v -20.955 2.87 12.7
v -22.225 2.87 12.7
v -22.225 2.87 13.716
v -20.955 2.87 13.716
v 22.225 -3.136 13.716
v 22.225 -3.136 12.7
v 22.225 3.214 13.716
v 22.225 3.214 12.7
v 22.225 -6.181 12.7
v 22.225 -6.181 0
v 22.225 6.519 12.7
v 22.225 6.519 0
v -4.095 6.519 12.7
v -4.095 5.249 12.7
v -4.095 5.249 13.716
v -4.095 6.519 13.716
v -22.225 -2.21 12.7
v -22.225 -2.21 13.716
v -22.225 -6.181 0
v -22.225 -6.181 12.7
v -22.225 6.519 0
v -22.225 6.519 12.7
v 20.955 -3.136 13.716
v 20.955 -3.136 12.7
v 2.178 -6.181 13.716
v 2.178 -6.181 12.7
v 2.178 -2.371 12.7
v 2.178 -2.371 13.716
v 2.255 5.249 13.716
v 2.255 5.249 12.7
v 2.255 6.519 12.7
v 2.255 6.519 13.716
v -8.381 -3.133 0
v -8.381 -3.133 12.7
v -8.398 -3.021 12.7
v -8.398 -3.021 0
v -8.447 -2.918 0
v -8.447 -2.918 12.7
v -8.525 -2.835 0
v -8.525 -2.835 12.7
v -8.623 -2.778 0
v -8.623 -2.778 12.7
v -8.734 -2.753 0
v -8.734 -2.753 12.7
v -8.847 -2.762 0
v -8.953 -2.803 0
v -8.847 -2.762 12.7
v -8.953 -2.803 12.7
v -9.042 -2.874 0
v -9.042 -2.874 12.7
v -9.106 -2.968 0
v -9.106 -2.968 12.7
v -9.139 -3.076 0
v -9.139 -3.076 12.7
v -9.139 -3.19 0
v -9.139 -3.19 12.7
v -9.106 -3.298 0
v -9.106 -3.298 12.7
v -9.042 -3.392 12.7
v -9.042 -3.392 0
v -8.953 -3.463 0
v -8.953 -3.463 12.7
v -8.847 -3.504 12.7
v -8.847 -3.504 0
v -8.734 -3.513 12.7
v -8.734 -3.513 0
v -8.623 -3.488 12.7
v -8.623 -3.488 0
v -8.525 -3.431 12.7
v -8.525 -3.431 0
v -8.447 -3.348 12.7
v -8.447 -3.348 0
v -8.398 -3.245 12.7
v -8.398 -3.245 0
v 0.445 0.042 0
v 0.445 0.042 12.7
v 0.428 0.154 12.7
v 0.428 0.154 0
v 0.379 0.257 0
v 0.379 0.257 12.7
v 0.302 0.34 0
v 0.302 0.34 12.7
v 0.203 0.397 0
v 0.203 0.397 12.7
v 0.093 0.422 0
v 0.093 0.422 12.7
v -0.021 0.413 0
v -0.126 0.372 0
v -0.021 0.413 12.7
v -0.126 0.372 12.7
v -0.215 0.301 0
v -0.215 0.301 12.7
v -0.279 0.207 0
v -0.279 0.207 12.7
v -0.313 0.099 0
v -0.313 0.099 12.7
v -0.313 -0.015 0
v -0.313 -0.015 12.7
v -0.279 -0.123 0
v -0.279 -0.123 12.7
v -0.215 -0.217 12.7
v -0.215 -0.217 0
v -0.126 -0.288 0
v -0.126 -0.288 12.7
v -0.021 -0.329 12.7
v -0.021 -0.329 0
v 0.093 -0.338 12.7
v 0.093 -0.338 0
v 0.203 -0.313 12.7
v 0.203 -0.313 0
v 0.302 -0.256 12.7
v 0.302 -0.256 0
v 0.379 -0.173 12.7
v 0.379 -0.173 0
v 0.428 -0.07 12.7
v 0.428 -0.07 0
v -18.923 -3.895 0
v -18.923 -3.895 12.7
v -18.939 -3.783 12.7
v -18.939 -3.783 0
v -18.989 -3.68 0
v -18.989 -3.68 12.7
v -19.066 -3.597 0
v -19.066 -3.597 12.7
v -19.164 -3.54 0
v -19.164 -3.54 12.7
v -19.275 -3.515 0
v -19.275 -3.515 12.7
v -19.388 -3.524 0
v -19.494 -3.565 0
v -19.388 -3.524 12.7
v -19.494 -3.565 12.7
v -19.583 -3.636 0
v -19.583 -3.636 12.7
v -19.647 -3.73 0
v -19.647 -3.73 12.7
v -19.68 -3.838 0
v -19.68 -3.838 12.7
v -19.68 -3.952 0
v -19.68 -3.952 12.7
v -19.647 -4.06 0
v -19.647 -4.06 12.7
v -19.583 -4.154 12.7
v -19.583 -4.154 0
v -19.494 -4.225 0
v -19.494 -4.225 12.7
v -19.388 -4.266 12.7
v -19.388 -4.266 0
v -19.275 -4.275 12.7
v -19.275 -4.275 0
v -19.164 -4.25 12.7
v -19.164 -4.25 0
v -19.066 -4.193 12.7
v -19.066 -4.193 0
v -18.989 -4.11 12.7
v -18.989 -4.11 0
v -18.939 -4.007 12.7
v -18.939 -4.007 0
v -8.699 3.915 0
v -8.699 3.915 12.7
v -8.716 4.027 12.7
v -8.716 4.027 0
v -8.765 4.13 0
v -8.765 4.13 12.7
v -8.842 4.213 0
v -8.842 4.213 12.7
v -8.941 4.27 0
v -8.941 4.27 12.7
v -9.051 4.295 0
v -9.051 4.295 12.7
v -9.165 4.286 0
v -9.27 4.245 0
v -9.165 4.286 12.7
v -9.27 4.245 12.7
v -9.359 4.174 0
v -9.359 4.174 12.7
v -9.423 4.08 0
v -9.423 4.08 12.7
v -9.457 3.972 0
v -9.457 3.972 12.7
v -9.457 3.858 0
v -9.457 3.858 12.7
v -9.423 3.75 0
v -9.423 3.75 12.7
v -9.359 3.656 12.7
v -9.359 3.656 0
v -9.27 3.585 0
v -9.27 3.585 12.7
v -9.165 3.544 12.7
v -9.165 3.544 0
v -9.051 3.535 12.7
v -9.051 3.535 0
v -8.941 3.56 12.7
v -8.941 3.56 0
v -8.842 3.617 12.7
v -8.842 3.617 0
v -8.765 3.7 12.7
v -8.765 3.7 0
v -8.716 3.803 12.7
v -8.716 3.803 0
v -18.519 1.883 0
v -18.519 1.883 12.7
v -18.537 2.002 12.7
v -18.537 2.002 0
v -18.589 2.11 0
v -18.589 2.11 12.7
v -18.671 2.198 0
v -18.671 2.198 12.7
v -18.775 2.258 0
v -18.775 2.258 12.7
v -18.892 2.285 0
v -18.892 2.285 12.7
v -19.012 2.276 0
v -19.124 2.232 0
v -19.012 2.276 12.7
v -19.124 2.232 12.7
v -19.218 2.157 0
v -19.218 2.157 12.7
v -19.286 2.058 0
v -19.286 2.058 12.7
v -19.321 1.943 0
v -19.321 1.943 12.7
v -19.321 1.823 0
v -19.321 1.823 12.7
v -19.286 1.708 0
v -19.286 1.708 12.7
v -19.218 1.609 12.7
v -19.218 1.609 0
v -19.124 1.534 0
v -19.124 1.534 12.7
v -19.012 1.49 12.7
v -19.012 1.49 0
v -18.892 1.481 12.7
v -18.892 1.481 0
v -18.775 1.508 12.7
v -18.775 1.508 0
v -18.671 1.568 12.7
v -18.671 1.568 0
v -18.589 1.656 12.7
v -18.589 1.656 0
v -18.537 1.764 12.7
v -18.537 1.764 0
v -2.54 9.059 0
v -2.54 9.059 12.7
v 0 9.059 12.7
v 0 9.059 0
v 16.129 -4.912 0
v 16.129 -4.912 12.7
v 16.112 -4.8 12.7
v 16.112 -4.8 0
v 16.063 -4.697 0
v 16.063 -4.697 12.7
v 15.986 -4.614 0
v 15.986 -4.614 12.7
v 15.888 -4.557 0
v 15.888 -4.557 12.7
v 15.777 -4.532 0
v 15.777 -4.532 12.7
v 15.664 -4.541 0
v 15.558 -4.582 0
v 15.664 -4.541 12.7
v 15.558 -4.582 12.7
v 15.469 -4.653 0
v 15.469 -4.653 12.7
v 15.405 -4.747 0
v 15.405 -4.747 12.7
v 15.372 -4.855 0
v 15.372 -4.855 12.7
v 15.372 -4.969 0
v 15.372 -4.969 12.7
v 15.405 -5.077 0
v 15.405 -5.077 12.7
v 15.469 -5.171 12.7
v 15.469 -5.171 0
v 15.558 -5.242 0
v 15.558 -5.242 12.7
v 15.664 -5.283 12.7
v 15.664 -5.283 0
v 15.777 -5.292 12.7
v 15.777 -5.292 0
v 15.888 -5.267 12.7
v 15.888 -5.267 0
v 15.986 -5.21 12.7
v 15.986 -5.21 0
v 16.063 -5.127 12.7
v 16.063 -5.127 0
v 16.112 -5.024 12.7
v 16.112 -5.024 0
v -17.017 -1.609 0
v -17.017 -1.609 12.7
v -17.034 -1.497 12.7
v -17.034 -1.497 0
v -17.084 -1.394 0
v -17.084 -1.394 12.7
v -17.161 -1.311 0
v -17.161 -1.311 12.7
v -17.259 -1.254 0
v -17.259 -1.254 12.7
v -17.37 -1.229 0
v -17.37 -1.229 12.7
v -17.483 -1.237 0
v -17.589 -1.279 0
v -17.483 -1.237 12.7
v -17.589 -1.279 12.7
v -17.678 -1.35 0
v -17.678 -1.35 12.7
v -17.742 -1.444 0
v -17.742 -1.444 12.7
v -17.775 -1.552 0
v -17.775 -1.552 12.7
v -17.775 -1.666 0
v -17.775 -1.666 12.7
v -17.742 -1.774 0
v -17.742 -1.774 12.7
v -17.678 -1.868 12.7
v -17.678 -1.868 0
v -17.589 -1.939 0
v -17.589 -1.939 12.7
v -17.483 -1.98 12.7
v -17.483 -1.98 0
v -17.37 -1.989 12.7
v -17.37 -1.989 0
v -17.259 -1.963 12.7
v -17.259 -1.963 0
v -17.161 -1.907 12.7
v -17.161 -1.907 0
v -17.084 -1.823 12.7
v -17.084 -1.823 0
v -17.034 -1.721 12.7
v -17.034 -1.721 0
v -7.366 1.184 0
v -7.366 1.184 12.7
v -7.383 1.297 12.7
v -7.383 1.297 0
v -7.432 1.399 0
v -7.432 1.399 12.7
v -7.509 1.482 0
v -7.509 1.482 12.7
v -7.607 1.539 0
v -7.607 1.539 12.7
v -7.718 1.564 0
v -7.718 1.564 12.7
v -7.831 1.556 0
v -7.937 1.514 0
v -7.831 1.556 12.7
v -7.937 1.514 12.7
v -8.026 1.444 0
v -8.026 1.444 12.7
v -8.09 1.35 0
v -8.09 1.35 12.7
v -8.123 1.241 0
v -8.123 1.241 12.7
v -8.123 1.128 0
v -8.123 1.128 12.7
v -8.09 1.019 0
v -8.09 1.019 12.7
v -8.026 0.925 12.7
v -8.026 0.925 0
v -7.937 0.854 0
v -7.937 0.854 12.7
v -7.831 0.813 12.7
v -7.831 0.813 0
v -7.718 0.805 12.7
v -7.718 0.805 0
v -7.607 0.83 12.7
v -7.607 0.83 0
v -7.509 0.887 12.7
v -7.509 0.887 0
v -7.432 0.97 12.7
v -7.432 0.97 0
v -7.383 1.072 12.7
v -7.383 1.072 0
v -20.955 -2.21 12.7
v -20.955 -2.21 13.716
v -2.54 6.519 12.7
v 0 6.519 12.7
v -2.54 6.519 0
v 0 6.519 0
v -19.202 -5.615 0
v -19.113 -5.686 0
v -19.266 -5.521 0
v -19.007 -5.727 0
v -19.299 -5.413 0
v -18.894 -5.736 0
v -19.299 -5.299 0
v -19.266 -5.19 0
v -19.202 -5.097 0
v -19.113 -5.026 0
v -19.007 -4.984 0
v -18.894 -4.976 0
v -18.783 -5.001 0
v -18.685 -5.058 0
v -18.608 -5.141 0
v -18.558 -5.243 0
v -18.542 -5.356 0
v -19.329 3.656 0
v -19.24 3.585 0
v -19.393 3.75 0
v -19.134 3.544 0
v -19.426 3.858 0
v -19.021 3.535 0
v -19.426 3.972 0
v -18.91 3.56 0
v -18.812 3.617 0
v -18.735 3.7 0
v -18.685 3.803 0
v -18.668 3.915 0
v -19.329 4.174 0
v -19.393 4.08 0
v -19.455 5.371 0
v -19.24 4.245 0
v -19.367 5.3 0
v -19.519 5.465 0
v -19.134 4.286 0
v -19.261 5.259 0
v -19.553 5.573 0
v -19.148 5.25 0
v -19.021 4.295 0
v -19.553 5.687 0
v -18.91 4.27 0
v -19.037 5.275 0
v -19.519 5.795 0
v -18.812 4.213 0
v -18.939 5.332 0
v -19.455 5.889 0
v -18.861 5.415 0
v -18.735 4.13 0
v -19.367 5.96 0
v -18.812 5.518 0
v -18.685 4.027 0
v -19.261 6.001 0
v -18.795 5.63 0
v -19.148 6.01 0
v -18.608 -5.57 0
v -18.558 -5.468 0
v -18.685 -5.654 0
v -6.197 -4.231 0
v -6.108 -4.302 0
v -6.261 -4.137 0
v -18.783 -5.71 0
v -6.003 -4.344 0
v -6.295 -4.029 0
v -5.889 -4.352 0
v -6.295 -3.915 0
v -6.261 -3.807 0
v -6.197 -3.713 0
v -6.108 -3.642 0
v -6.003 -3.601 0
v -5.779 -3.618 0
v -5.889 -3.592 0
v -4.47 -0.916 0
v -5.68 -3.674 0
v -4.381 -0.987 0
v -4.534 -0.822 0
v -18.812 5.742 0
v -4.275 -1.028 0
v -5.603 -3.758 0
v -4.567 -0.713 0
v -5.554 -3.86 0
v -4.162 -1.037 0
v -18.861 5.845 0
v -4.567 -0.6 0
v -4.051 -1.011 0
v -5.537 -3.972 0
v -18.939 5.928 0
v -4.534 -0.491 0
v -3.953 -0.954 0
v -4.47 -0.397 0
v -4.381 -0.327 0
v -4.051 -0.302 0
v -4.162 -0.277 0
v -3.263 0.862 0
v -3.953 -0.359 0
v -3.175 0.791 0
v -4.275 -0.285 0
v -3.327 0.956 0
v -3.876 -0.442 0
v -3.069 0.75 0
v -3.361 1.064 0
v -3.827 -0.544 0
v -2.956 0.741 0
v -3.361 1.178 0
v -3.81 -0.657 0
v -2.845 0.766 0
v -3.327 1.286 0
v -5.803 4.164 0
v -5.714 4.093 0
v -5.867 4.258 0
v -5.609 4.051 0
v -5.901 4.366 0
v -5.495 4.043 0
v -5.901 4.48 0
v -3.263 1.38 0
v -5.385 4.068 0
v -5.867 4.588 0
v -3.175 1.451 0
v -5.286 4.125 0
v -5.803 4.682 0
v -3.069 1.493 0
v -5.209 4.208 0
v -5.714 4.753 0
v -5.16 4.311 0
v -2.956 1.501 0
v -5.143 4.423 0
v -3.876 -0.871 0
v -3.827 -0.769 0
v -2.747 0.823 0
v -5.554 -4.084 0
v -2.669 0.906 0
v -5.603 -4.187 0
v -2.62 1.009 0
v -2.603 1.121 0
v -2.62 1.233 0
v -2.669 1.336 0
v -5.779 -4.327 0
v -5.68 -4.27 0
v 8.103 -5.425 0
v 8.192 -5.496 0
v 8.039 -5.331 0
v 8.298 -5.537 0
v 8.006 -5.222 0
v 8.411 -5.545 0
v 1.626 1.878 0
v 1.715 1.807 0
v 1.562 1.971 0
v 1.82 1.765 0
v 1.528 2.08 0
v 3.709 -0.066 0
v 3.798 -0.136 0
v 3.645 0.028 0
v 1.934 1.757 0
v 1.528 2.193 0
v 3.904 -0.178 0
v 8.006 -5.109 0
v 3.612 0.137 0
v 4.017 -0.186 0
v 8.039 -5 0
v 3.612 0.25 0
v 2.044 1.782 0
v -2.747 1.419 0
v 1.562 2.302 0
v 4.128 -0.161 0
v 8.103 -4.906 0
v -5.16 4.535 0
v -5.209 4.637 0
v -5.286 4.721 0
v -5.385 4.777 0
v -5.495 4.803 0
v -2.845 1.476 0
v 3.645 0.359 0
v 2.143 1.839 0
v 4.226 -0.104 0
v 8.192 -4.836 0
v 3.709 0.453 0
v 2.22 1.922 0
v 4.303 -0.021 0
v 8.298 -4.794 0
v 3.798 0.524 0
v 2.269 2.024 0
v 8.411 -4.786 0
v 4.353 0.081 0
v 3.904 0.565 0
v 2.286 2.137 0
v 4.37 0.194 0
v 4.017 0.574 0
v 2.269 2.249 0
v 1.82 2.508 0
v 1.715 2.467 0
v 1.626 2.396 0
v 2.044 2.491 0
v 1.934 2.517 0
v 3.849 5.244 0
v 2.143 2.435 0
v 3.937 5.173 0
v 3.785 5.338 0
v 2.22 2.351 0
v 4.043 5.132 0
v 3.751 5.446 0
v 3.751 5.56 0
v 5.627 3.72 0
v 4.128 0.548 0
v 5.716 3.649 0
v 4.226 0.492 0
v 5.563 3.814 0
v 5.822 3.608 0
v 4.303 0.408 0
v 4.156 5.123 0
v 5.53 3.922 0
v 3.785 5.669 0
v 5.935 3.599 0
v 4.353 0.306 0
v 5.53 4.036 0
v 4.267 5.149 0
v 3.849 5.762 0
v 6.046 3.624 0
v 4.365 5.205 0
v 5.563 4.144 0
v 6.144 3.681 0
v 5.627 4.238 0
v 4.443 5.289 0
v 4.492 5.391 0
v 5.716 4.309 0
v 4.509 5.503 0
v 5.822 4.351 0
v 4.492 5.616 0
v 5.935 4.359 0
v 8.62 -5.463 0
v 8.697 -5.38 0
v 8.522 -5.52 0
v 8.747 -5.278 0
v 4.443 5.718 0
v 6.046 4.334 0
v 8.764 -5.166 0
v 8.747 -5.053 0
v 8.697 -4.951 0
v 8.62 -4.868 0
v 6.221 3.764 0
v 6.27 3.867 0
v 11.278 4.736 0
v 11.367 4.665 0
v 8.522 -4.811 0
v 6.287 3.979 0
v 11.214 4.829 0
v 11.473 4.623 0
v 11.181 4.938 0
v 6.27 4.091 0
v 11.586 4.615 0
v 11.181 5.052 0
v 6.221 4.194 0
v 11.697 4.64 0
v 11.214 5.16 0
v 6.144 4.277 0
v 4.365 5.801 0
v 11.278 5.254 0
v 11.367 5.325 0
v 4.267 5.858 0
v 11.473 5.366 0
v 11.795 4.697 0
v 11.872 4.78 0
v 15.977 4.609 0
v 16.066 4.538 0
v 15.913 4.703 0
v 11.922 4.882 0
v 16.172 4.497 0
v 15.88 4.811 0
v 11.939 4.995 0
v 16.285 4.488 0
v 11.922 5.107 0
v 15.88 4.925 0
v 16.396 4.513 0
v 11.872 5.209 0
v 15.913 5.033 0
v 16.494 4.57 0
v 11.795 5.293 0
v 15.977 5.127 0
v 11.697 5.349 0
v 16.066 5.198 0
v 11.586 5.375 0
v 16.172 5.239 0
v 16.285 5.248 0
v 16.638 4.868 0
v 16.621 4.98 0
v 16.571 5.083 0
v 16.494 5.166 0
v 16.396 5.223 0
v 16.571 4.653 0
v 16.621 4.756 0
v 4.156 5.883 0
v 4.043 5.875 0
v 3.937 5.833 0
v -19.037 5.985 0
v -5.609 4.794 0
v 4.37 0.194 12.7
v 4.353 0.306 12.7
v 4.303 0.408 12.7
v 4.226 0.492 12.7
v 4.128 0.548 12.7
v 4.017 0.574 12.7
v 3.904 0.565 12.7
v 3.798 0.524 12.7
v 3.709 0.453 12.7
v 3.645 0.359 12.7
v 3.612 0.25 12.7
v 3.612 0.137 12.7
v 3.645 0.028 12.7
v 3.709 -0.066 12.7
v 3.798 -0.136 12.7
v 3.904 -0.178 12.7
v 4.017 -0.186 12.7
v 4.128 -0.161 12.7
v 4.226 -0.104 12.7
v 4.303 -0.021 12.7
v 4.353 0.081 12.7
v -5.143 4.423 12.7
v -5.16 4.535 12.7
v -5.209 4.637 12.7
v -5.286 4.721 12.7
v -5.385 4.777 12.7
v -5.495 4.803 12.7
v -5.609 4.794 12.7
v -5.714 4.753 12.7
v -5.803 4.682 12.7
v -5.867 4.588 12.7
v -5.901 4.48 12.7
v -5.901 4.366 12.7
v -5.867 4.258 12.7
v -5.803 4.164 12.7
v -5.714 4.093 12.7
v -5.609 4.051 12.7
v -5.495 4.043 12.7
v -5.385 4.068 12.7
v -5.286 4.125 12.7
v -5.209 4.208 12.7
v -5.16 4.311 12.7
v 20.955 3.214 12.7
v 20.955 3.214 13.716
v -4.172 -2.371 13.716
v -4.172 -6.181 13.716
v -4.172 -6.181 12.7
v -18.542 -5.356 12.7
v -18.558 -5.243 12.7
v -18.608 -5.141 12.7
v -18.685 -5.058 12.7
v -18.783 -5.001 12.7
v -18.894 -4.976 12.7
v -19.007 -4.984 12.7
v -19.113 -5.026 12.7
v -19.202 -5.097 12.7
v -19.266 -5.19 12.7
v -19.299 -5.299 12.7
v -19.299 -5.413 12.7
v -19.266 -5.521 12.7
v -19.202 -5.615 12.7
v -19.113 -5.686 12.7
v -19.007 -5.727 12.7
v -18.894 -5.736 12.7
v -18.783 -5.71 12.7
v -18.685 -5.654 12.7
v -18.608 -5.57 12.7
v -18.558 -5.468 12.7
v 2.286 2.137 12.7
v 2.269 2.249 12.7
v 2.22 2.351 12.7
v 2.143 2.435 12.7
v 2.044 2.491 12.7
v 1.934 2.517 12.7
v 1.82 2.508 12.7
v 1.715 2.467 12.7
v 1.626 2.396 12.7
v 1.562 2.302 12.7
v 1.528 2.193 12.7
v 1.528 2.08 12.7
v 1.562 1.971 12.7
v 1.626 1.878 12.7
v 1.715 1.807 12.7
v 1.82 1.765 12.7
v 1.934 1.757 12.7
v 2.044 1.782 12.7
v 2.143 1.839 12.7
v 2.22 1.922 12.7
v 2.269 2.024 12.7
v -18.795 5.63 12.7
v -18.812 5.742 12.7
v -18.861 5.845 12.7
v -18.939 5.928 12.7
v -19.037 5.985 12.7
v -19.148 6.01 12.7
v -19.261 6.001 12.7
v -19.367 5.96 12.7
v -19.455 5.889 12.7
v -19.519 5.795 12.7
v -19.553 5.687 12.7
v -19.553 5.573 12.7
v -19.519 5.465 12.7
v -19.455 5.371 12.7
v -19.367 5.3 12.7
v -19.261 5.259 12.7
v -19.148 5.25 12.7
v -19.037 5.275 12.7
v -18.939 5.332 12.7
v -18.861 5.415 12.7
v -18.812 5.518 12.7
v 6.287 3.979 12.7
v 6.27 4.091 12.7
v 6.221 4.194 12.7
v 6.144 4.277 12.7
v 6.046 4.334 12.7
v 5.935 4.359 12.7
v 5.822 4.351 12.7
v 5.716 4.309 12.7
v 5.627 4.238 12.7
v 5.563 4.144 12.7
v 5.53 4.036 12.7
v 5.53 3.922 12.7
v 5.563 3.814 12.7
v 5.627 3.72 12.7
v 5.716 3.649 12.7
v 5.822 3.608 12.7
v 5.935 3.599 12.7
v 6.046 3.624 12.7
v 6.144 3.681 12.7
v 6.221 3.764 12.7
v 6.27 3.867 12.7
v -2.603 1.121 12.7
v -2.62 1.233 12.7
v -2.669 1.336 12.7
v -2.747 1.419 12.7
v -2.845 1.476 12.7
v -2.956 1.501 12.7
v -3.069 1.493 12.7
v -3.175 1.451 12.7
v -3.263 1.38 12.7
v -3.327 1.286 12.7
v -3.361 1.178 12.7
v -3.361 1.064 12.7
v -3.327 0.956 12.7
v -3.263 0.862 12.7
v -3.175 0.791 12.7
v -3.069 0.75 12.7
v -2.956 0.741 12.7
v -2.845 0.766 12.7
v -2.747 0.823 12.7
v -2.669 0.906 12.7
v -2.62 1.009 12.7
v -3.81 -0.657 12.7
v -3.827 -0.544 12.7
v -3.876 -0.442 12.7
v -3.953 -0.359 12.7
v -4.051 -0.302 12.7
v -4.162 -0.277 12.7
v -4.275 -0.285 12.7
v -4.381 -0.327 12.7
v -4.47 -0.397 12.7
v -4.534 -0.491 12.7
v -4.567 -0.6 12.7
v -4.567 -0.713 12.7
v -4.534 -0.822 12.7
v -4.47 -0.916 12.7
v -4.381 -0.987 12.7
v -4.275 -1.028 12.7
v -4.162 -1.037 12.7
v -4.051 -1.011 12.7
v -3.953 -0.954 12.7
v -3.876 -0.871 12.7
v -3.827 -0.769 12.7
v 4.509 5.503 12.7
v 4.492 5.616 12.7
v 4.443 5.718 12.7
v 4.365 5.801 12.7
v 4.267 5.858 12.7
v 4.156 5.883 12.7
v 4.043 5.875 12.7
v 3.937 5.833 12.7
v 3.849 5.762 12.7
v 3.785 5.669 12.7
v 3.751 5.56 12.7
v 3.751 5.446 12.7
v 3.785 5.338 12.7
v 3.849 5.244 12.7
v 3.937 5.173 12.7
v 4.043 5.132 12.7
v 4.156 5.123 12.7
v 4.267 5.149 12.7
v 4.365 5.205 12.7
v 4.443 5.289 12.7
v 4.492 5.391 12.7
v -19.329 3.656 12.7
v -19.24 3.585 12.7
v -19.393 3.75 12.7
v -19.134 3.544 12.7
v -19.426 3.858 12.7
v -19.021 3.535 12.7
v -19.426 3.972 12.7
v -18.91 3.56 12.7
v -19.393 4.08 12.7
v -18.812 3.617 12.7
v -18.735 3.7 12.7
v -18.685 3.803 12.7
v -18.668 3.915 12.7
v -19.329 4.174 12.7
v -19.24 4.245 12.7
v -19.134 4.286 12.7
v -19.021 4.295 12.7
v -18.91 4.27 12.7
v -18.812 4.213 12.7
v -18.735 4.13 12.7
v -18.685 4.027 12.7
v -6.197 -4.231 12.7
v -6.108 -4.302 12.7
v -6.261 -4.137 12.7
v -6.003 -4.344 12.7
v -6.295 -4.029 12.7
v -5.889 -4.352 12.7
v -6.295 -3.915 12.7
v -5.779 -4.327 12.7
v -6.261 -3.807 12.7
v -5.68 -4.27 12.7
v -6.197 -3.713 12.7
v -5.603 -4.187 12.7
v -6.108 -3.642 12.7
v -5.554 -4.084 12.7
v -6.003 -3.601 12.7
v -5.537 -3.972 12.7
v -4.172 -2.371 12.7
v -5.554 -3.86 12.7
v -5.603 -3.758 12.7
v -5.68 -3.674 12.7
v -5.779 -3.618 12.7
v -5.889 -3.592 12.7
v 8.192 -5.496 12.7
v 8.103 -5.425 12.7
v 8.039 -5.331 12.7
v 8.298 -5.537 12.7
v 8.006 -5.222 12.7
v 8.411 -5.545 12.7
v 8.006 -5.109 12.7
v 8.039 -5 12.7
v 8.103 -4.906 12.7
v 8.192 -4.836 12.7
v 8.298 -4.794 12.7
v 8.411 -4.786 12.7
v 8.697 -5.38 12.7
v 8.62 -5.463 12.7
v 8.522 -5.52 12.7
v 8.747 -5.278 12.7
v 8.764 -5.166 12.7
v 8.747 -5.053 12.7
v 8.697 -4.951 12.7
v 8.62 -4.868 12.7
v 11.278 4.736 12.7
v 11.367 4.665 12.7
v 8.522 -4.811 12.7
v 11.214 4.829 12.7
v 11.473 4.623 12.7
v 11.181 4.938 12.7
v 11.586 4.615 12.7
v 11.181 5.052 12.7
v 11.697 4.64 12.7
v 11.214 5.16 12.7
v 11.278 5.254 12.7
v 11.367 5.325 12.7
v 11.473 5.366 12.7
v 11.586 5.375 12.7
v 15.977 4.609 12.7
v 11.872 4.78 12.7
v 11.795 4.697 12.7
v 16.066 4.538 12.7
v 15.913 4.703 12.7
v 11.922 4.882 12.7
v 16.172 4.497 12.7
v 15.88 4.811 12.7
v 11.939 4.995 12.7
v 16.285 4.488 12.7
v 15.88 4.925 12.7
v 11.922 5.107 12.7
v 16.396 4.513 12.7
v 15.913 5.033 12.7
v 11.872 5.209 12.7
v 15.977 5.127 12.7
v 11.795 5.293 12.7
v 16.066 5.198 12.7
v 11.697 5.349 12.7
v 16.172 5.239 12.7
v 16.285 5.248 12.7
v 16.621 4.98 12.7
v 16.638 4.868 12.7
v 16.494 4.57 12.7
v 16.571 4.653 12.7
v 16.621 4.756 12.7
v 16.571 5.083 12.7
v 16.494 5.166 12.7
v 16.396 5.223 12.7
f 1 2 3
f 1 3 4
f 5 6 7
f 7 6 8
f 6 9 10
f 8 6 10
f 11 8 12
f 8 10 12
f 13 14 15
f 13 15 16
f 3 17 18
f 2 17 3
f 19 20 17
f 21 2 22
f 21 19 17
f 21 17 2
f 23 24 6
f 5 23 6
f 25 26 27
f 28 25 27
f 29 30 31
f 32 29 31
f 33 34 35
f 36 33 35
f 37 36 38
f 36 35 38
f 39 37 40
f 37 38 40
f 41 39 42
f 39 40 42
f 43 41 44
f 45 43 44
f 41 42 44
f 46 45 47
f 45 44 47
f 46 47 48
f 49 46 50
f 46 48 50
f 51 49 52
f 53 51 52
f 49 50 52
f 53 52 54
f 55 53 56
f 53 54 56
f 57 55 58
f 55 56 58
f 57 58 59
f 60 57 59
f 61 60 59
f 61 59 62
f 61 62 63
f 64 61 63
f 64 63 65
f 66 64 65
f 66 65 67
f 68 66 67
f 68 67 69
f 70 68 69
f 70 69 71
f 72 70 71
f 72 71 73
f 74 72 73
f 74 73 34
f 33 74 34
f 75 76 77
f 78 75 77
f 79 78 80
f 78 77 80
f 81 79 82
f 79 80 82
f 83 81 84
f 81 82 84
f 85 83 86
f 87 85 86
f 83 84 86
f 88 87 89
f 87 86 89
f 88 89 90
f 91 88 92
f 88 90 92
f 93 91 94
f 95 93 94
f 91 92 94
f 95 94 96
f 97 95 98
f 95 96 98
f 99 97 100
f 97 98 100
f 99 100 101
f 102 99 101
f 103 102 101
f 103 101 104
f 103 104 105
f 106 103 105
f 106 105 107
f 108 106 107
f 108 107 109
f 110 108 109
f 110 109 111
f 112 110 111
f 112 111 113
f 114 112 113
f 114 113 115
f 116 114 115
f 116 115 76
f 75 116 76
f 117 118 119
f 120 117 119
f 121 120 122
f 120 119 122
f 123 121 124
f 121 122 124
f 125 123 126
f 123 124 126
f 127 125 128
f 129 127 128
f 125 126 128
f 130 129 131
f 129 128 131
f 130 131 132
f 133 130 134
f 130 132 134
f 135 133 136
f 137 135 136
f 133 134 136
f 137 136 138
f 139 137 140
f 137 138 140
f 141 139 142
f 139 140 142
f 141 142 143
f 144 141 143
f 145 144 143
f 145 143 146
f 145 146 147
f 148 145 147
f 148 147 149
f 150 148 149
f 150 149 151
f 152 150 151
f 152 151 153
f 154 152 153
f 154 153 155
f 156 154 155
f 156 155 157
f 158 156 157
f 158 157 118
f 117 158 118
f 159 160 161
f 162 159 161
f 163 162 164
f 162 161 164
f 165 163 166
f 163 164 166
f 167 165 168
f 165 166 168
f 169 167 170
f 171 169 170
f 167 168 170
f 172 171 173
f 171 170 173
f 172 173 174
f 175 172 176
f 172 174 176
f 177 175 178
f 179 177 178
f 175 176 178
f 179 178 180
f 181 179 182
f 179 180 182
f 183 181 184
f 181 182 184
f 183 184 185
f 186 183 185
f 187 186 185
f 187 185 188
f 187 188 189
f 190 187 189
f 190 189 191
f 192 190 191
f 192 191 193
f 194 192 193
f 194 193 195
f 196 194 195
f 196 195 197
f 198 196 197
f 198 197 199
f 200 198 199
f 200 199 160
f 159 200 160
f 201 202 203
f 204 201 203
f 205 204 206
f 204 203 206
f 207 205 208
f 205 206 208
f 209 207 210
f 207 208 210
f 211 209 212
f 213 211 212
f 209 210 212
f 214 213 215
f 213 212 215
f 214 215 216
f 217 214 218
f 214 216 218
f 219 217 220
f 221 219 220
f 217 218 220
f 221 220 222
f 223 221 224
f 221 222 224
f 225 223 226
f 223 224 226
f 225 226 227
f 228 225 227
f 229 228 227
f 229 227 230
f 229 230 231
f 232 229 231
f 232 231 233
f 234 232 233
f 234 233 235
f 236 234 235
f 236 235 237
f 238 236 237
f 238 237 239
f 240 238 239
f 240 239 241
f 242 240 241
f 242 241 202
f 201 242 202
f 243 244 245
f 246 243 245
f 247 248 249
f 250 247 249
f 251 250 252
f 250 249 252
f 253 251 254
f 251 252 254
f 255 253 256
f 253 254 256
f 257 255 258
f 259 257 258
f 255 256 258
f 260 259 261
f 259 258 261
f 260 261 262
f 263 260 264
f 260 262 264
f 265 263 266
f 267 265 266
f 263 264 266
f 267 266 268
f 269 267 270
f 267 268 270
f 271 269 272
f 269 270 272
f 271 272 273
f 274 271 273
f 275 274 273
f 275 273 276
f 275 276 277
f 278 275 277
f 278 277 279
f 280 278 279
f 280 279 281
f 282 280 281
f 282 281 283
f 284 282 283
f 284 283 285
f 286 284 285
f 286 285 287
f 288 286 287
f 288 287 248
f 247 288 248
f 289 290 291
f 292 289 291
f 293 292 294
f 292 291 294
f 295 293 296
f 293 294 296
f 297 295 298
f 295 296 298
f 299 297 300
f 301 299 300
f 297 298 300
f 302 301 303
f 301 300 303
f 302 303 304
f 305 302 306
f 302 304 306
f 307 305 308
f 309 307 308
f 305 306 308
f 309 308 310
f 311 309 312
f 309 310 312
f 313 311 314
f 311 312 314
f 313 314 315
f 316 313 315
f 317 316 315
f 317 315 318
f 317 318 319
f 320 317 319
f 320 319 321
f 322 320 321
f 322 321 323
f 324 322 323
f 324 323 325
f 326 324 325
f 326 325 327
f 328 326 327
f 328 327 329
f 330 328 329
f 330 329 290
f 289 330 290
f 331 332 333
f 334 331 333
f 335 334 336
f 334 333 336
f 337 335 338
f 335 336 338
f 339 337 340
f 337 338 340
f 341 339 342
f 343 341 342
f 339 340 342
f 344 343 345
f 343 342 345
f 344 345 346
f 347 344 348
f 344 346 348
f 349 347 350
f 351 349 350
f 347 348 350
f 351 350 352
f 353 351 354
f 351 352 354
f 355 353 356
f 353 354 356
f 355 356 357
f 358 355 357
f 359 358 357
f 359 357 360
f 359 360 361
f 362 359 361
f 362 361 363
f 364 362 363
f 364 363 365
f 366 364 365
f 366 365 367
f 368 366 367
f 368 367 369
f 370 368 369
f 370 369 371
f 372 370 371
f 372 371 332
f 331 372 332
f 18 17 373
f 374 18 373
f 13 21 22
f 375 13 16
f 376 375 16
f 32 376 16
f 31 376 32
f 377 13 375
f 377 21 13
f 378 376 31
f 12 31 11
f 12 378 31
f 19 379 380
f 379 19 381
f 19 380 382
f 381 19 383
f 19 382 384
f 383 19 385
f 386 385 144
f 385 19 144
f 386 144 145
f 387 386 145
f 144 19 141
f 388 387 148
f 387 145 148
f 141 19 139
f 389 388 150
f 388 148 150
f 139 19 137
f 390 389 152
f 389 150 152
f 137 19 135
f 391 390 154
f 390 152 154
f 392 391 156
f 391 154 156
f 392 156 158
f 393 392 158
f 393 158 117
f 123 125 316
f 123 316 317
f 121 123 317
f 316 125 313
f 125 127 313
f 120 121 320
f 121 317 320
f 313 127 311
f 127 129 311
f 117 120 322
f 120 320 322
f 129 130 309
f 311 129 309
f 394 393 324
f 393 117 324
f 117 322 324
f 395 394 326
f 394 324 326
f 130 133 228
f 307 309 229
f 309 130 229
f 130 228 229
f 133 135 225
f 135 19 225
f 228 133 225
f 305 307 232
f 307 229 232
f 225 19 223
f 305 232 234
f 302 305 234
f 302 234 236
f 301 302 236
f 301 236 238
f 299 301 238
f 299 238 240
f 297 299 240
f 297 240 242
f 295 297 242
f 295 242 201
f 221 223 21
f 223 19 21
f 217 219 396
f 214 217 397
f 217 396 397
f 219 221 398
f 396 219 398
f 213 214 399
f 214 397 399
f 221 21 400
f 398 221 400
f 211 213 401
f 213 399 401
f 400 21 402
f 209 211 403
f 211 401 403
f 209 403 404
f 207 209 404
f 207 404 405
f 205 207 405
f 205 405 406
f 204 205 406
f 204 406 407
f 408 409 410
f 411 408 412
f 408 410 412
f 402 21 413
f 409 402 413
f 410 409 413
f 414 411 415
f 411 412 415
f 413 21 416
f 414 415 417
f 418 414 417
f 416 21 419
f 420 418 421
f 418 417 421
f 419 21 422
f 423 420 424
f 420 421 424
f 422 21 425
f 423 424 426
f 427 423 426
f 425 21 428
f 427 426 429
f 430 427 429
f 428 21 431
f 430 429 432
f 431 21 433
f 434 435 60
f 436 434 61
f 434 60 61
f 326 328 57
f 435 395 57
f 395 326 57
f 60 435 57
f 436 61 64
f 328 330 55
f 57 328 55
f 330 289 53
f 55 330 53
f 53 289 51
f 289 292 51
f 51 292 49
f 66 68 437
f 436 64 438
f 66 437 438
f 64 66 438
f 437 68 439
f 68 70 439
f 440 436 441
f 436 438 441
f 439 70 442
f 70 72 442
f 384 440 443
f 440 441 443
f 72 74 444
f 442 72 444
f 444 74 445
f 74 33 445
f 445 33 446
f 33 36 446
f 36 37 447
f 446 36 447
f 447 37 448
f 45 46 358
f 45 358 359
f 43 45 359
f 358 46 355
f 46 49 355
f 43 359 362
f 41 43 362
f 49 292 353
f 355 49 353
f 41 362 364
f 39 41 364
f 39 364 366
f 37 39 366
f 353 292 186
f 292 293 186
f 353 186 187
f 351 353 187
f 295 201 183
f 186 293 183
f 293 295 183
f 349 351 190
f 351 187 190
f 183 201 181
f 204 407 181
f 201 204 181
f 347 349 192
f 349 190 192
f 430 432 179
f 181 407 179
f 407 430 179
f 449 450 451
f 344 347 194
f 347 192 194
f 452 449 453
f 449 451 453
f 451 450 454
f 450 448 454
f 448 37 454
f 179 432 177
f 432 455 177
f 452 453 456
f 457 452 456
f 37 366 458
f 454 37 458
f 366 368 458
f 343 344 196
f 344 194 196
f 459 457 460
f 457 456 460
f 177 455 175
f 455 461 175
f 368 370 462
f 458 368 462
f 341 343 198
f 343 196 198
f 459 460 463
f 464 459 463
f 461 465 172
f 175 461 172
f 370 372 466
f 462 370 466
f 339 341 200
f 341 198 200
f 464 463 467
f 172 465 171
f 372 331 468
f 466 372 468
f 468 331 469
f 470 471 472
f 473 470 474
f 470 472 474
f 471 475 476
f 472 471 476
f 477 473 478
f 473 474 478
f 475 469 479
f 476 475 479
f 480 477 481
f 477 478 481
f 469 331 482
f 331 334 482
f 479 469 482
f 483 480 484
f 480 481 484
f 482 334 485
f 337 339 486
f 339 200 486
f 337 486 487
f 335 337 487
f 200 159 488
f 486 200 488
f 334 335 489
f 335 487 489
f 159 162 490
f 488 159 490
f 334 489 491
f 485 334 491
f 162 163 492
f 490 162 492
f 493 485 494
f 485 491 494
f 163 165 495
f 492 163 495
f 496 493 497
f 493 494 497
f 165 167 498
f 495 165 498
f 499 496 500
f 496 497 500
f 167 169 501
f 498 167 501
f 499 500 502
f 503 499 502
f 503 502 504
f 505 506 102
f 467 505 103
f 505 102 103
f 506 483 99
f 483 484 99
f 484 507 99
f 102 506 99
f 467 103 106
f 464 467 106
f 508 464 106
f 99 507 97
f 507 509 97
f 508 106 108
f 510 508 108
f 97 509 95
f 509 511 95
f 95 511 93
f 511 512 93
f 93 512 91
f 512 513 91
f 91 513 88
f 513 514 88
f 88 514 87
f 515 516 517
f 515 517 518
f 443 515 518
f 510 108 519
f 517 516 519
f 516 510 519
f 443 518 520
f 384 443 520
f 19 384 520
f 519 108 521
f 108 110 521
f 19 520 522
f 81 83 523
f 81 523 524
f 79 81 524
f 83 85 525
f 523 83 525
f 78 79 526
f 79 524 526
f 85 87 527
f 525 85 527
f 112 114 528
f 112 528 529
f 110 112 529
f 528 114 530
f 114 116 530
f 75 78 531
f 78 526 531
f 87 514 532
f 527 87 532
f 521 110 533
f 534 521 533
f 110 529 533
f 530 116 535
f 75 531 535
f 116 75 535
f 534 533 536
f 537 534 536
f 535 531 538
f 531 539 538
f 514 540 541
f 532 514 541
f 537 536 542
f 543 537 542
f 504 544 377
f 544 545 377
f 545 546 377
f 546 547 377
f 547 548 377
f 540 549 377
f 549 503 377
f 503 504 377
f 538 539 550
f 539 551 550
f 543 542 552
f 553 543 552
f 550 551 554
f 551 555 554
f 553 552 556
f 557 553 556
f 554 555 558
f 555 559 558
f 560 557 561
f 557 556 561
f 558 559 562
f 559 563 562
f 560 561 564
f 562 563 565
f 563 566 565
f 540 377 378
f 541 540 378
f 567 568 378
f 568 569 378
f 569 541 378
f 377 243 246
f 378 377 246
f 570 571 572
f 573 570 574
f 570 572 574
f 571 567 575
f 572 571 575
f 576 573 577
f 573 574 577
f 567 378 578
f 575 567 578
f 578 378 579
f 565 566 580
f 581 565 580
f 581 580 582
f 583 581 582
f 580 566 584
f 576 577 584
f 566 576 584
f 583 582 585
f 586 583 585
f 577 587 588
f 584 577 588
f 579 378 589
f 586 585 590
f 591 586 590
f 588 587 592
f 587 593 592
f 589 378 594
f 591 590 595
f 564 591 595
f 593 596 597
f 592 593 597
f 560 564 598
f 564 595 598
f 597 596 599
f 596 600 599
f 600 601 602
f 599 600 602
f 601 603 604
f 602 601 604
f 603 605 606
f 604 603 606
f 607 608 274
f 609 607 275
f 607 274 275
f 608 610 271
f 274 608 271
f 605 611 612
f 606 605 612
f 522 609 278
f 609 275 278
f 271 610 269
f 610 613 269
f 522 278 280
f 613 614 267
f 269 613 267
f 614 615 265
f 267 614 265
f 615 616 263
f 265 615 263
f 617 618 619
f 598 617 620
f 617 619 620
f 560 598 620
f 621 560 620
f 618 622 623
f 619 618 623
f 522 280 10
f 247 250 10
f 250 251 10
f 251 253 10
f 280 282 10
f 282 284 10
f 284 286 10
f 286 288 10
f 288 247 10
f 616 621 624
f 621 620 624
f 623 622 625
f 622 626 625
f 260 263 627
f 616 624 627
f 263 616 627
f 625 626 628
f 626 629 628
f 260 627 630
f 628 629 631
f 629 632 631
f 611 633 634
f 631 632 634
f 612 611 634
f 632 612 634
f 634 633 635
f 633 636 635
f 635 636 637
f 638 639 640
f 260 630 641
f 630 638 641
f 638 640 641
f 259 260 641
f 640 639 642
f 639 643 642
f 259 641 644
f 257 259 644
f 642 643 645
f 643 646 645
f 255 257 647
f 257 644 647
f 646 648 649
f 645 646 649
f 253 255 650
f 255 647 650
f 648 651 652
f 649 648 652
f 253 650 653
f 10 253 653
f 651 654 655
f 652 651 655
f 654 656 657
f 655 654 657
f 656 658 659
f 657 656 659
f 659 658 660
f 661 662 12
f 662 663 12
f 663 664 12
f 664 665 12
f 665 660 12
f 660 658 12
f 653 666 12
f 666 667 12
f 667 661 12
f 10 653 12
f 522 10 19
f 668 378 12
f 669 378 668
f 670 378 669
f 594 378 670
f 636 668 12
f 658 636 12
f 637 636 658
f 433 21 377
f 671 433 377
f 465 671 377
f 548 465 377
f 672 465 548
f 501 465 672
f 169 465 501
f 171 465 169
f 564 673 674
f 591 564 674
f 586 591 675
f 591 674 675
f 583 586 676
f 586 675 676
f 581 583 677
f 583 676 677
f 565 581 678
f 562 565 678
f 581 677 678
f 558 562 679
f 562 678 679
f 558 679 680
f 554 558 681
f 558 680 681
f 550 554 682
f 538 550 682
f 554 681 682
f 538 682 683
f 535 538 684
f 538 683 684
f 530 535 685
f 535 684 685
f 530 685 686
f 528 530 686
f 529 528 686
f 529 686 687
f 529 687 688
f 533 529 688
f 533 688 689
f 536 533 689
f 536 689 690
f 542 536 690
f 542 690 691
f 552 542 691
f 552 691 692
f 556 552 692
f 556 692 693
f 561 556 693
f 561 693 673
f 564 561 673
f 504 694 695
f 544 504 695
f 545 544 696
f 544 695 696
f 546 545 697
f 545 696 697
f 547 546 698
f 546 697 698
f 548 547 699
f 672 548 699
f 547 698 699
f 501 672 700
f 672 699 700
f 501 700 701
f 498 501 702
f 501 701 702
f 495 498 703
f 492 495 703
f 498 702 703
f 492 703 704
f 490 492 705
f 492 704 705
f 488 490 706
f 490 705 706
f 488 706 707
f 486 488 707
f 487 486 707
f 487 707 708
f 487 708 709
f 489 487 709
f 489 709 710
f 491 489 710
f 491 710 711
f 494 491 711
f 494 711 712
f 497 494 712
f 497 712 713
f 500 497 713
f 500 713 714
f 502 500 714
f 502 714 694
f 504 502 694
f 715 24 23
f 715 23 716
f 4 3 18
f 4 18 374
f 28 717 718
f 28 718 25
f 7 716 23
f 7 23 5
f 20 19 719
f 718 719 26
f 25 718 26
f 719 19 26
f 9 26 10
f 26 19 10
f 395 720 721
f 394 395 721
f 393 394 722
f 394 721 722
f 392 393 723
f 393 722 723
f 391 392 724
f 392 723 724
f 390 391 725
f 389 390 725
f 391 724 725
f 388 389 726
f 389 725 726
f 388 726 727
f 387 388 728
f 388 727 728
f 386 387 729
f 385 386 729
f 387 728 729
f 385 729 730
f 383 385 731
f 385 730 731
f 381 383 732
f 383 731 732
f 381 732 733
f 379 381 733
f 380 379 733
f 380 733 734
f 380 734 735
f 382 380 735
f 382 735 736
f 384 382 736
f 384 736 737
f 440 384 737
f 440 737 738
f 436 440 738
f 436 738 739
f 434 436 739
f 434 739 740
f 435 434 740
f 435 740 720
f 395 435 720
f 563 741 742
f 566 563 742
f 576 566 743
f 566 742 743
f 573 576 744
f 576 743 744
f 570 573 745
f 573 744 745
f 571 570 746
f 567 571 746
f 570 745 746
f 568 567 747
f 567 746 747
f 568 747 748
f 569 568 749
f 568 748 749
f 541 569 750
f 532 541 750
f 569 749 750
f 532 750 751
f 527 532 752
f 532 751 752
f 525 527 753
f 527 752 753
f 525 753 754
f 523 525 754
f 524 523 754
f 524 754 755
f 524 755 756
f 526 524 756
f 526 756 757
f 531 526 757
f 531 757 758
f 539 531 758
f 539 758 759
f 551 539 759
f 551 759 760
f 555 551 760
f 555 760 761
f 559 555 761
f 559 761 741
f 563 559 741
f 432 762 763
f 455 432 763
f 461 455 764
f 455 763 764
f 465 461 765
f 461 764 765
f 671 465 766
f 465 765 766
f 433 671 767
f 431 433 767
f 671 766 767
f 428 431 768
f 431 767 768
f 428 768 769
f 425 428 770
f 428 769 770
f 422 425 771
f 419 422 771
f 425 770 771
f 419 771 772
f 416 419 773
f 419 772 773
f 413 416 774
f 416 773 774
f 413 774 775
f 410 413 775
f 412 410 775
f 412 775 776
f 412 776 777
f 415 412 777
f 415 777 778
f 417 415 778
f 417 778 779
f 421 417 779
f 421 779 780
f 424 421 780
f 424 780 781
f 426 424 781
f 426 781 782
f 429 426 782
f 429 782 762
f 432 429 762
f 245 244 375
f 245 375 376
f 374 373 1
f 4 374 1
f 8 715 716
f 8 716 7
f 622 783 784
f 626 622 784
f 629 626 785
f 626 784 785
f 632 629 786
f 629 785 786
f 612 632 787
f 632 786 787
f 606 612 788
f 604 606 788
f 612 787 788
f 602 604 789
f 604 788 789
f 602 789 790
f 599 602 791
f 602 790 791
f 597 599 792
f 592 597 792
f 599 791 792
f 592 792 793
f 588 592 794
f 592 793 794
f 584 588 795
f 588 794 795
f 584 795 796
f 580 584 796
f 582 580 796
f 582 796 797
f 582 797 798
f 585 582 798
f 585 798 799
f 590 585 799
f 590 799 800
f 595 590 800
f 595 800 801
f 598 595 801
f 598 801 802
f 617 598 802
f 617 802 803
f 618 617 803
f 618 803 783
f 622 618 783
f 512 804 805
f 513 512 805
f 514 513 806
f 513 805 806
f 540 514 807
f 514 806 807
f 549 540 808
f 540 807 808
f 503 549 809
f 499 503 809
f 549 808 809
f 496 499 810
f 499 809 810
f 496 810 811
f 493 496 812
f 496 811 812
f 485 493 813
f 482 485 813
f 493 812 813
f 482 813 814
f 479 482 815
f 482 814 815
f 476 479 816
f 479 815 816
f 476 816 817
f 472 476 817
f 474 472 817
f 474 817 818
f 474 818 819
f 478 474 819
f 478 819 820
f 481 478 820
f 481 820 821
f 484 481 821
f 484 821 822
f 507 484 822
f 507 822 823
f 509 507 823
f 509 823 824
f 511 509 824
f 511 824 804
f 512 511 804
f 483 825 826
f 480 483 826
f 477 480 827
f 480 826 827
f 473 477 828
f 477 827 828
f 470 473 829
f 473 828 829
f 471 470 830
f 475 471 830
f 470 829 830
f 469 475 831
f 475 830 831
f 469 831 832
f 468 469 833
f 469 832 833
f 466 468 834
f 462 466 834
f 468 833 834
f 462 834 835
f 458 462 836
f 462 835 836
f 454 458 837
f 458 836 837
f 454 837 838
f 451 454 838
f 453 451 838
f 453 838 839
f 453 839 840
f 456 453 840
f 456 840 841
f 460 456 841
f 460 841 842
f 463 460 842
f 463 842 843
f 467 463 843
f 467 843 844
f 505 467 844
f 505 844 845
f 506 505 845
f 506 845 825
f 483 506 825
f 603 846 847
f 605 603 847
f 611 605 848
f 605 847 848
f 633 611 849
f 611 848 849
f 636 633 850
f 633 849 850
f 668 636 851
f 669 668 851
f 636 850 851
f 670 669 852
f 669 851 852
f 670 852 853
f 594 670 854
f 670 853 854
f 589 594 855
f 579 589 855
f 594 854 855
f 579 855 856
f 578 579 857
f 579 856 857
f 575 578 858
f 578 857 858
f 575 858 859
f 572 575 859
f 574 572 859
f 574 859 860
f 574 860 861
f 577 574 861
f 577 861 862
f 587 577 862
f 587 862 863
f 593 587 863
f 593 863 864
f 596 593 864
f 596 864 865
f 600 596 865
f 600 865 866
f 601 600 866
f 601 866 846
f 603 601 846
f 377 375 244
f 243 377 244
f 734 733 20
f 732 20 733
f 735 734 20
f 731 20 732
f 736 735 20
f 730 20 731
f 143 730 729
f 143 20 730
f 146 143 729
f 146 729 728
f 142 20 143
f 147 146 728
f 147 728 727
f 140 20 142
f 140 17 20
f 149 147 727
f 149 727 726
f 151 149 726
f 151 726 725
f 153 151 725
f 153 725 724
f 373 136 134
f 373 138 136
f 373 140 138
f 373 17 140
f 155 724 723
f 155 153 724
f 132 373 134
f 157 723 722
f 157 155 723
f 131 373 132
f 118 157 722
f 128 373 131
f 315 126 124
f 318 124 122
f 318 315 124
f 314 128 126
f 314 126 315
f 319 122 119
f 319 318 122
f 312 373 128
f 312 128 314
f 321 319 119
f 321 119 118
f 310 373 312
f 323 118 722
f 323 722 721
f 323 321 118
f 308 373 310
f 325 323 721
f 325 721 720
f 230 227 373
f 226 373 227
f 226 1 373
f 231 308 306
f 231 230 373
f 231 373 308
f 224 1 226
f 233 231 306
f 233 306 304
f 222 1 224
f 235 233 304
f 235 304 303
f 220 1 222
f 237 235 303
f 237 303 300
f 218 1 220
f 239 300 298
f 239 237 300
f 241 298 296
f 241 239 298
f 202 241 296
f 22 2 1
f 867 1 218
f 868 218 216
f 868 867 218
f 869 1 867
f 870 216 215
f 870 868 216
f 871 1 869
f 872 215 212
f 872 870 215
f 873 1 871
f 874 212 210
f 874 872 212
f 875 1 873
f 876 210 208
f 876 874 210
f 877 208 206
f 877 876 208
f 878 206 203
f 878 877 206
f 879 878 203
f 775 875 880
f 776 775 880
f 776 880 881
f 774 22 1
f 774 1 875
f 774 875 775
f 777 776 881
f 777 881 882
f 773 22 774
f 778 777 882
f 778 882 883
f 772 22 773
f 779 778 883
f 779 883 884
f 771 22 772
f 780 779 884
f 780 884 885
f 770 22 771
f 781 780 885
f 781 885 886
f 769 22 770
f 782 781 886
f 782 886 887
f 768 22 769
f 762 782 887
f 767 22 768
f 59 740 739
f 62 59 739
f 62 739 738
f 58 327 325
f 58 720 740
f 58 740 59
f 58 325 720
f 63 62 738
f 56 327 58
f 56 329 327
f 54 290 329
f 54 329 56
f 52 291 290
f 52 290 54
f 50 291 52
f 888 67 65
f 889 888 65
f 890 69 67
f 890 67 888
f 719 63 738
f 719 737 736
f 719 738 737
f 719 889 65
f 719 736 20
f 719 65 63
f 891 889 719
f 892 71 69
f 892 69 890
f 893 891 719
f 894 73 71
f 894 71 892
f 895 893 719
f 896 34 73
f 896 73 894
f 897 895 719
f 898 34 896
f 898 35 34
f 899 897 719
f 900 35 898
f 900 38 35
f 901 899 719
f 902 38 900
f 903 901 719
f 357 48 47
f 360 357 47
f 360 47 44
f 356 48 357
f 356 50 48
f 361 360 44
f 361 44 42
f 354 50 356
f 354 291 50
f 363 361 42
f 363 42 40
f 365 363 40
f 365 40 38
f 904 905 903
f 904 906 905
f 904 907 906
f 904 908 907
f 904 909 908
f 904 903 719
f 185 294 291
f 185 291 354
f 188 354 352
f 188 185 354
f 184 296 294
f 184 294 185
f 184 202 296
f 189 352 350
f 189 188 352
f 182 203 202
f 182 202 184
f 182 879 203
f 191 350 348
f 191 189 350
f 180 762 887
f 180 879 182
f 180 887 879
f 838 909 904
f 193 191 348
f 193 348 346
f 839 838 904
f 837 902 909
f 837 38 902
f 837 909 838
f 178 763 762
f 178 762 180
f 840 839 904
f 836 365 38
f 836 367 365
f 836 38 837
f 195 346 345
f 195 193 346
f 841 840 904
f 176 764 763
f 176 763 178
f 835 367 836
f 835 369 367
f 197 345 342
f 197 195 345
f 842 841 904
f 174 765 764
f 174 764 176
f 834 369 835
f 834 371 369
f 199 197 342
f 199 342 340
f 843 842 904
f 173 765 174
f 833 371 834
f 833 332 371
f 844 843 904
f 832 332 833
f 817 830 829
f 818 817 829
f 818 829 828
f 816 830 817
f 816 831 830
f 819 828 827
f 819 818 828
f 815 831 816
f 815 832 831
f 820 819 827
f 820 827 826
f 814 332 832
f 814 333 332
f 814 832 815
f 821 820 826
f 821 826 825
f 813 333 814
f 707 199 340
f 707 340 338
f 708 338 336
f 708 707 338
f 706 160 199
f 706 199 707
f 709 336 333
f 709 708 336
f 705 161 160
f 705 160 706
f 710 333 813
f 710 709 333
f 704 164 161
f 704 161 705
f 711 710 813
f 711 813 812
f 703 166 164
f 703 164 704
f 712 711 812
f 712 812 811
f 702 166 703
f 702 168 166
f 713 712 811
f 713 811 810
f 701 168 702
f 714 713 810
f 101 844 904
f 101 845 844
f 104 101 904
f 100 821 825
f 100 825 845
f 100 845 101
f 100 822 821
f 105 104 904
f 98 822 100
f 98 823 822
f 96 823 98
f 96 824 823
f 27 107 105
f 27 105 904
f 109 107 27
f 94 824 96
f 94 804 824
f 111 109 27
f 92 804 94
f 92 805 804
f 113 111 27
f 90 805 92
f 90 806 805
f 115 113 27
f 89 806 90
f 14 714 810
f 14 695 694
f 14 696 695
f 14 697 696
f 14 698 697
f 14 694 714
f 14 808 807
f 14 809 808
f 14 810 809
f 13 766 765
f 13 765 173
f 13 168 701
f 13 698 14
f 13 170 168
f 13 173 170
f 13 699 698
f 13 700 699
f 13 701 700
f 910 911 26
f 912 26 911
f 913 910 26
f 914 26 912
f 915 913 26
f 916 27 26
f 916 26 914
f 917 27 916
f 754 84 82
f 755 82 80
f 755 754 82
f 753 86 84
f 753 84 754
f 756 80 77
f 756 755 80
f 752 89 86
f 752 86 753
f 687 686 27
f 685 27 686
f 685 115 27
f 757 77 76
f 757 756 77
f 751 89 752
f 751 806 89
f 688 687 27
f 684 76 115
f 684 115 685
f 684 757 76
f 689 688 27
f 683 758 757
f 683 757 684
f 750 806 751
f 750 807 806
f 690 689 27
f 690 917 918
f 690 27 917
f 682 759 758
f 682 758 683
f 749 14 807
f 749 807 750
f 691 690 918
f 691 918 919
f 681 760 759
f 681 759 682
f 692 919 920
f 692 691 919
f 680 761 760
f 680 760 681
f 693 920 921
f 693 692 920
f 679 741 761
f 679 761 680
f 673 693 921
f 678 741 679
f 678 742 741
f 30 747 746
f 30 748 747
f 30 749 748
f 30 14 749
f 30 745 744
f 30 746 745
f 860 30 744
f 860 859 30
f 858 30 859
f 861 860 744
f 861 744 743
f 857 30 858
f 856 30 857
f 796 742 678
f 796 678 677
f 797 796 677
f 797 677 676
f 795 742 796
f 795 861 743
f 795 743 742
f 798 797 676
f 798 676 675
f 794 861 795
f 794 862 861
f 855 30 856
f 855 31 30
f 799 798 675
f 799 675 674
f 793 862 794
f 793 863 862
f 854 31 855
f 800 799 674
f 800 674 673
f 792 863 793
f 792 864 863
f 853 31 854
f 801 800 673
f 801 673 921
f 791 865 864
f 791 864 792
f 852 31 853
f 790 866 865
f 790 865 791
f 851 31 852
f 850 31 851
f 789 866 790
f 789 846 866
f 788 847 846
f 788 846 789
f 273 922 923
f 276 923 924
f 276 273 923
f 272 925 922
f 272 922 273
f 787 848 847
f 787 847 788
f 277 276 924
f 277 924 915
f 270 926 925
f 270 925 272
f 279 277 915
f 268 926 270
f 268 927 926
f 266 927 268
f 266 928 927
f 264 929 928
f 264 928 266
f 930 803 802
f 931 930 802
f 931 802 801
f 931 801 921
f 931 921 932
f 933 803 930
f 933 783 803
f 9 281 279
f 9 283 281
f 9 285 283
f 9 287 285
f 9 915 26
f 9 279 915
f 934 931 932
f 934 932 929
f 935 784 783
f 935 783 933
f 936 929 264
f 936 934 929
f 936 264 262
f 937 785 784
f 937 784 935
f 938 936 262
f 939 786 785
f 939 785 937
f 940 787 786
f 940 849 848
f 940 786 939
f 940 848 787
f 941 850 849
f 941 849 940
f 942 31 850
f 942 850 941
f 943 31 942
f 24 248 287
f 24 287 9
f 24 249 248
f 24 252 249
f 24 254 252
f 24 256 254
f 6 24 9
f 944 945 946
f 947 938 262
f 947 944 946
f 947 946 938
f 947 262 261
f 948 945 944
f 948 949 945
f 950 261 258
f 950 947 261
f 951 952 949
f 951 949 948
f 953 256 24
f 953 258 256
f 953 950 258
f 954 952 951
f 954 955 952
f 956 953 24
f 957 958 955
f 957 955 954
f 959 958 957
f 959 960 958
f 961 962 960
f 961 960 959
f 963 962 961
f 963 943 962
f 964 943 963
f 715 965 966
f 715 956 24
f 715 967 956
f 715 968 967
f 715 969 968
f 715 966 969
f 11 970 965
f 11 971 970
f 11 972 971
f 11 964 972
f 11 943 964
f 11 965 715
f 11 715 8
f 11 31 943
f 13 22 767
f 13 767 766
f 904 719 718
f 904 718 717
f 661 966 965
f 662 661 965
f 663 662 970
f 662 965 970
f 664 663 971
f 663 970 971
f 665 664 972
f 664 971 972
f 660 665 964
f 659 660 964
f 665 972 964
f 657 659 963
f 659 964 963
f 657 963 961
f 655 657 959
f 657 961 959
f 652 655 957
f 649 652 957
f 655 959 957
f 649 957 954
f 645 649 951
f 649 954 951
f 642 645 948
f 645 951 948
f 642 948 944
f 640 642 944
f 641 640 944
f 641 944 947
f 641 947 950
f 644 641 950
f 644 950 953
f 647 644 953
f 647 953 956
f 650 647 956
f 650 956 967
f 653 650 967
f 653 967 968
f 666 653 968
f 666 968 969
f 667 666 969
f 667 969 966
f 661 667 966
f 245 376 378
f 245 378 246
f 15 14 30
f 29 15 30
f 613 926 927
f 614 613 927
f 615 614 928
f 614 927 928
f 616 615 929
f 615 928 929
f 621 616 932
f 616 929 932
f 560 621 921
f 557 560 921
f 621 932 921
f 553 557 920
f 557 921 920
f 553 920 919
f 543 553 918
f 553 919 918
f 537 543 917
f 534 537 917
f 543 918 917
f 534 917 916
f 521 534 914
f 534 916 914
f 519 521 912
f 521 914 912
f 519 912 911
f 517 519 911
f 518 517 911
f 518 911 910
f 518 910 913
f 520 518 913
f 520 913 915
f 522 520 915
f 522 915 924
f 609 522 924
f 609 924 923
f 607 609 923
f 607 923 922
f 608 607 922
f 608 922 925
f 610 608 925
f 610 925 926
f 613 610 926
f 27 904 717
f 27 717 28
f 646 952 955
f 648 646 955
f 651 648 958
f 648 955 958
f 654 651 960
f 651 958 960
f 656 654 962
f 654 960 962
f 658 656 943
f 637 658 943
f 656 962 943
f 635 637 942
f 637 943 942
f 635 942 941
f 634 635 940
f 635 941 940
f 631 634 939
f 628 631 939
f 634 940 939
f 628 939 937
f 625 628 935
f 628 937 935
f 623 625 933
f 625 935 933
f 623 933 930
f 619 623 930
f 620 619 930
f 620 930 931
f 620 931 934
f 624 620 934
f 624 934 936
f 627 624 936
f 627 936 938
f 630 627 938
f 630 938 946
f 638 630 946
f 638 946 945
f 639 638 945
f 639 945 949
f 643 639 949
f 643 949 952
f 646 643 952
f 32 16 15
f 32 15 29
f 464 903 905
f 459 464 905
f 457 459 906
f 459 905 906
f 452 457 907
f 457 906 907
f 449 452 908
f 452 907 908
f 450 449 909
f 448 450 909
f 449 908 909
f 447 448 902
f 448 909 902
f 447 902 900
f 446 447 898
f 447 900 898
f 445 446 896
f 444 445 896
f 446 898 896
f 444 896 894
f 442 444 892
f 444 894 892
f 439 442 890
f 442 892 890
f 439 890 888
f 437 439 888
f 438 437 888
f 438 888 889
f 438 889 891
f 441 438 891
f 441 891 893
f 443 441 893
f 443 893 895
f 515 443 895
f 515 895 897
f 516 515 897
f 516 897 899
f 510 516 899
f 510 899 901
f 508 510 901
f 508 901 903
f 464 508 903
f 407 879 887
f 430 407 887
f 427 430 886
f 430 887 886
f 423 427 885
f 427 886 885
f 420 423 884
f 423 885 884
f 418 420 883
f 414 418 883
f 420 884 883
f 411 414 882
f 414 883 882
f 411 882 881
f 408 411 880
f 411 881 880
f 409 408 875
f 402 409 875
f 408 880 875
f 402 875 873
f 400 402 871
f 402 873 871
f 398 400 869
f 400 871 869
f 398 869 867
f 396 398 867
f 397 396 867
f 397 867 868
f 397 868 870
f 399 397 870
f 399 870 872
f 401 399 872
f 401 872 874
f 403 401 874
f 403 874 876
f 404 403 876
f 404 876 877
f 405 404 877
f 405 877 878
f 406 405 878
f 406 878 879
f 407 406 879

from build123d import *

# Parameters (mm, degrees)
F1_W     = 44.45
F1_H     = 12.699974
F2_DEPTH = 12.7
F3_R     = 0.381
F3_R_2   = 0.403108
F4_DEPTH = 12.701
F5_W     = 2.54
F5_H     = 2.54
F6_DEPTH = 12.7
F7_W     = 6.35
F7_H     = 1.27
F7_H_2   = 3.81
F7_W_2   = 1.27
F7_H_3   = 6.35
F7_H_4   = 5.08
F8_DEPTH = 1.016


with BuildPart() as f2:
    # F1 (on face) → F2 (new body)
    with BuildSketch(Plane.XY):
        with Locations((0, 0.168821)):
            Rectangle(F1_W, F1_H)
    extrude(amount=F2_DEPTH)

    # F3 (on face) → F4 (cut, through all)
    with BuildSketch(Plane.XY.offset(12.7)):
        with Locations((-18.92253, -5.355717)):
            Circle(F3_R)
        with Locations((-19.303555, -3.895014)):
            Circle(F3_R)
        with Locations((-17.398416, -1.608836)):
            Circle(F3_R)
        with Locations((-18.92253, 1.883105)):
            Circle(F3_R_2)
        with Locations((-19.049302, 3.915029)):
            Circle(F3_R)
        with Locations((-19.176098, 5.630012)):
            Circle(F3_R)
        with Locations((-9.079903, 3.915029)):
            Circle(F3_R)
        with Locations((-7.746632, 1.184453)):
            Circle(F3_R)
        with Locations((-8.762251, -3.132963)):
            Circle(F3_R)
        with Locations((-5.917971, -3.972179)):
            Circle(F3_R)
        with Locations((-4.190606, -0.656615)):
            Circle(F3_R)
        with Locations((-2.984132, 1.121054)):
            Circle(F3_R)
        with Locations((-5.523878, 4.422826)):
            Circle(F3_R)
        with Locations((0.064084, 0.042037)):
            Circle(F3_R)
        with Locations((1.90514, 2.136673)):
            Circle(F3_R)
        with Locations((3.988689, 0.193624)):
            Circle(F3_R)
        with Locations((8.382508, -5.165547)):
            Circle(F3_R)
        with Locations((5.906389, 3.979088)):
            Circle(F3_R)
        with Locations((4.127881, 5.503215)):
            Circle(F3_R)
        with Locations((11.557508, 4.994732)):
            Circle(F3_R)
        with Locations((16.256635, 4.867961)):
            Circle(F3_R)
        with Locations((15.748381, -4.912004)):
            Circle(F3_R)
    extrude(amount=-F4_DEPTH, mode=Mode.SUBTRACT)

    # F5 (on face) → F6 (join, through all)
    with BuildSketch(Plane.XY.offset(12.7)):
        with Locations((-1.27, 7.788808)):
            Rectangle(F5_W, F5_H)
    extrude(amount=-F6_DEPTH)

    # F7 (on face) → F8 (join)
    with BuildSketch(Plane.XY.offset(12.7)):
        with Locations((-0.919895, 5.883808)):
            Rectangle(F7_W, F7_H)
        with Locations((-0.996524, -4.276166)):
            Rectangle(F7_W, F7_H_2)
        with Locations((21.59, 0.039154)):
            Rectangle(F7_W_2, F7_H_3)
        with Locations((-21.59, 0.329979)):
            Rectangle(F7_W_2, F7_H_4)
    extrude(amount=F8_DEPTH)


solid = f2.part
